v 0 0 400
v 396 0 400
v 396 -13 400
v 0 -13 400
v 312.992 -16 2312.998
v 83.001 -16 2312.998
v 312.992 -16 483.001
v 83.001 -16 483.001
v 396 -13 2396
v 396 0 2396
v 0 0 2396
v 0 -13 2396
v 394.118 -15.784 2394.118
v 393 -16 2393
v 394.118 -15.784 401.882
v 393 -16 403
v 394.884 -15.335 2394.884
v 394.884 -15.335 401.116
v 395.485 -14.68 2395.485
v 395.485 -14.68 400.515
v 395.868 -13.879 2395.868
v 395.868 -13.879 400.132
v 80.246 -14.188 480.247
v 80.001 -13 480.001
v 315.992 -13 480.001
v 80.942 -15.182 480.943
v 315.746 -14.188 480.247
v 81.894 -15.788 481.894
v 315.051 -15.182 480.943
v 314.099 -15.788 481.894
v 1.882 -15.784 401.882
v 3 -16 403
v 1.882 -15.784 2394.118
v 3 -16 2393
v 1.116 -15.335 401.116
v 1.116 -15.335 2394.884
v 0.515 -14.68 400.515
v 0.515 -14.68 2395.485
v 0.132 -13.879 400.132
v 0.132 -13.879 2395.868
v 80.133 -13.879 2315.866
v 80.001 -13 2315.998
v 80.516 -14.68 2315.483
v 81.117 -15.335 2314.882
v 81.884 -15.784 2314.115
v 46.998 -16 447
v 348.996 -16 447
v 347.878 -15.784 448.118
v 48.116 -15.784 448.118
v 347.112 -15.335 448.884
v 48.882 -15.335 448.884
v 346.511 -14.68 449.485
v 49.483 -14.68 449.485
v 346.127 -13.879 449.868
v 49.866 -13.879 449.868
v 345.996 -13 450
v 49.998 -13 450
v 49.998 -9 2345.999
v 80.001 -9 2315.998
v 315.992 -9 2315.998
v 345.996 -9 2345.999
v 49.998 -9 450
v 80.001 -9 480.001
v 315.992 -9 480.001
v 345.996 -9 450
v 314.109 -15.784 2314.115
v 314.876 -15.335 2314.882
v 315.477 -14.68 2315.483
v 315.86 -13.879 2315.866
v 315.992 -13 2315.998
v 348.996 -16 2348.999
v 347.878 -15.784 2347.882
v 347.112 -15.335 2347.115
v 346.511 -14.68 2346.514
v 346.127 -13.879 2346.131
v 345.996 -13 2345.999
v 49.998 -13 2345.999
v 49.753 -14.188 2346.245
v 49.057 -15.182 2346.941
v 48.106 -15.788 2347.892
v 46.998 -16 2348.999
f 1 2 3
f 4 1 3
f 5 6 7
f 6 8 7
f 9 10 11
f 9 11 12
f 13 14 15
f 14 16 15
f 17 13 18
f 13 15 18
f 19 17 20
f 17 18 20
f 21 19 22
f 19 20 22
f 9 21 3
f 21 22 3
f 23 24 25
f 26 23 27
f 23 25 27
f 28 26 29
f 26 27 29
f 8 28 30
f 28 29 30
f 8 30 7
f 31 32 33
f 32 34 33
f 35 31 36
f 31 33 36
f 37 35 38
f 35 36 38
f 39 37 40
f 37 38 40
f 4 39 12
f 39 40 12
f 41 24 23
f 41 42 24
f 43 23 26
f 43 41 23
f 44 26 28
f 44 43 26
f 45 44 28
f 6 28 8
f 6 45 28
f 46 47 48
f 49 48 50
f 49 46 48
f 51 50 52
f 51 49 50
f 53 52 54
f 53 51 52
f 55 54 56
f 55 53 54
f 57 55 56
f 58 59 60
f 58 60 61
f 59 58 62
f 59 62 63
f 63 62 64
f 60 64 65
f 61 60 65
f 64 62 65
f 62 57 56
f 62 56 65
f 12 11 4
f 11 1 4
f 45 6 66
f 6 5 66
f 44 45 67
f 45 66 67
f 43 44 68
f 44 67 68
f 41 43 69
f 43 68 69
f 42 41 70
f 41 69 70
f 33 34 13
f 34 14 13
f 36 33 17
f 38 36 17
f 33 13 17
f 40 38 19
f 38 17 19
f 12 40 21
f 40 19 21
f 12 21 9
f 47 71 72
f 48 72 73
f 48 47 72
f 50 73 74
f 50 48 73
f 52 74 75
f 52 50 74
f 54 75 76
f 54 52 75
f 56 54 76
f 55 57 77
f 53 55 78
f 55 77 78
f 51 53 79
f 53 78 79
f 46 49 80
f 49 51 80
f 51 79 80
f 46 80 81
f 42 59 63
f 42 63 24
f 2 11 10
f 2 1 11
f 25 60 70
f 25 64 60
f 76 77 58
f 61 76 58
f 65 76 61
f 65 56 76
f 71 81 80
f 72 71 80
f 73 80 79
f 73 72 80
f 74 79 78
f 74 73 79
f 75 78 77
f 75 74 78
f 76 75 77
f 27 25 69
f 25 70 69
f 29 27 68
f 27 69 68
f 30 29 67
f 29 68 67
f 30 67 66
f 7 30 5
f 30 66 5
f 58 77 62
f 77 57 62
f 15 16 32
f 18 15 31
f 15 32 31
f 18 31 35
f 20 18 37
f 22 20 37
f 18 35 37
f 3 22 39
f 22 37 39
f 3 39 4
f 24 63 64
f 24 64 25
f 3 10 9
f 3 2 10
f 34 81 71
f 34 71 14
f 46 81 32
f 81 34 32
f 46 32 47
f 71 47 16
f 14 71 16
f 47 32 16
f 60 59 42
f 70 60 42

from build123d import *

# Parameters (mm, degrees)
F0_W      = 44.656470418
F0_H      = 33.8078811765
F1_DEPTH  = 16
F2_DEPTH  = 796
F3_DEPTH  = 196
F4_W      = 68.9578056335
F4_H      = 493.6993122101
F5_DEPTH  = 7
F6_DEPTH  = 9.7
F7_DEPTH  = 99.33
F8_DEPTH  = 99.33
F9_DEPTH  = 17.34
F10_DEPTH = 102.97
F11_W     = 35.2807044983
F11_H     = 492.0964837074
F12_DEPTH = 7
F13_DEPTH = 37.27
F14_DEPTH = 6.58
F15_DEPTH = 106.63
F16_DEPTH = 5.87
F17_DEPTH = 200
F18_DEPTH = 200
F19_DEPTH = 200
F20_DEPTH = 200
F21_DEPTH = 200
F22_DEPTH = 200
F23_DEPTH = 400
F24_DEPTH = 400
F25_DEPTH = 400
F26_DEPTH = 400
F27_DEPTH = 400
F28_DEPTH = 400
F29_DEPTH = 400
F30_DEPTH = 400
F31_DEPTH = 400
F32_DEPTH = 1000
F33_DEPTH = 1000
F34_DEPTH = 1000
F35_DEPTH = 1000
F36_DEPTH = 1000
F37_DEPTH = 1000
F38_DEPTH = 600
F39_DEPTH = 600
F40_DEPTH = 600
F41_R     = 3


with BuildPart() as f1:
    # F0 (on Front) → F1 (new body)
    with BuildSketch(Plane.XZ):
        with Locations((22.328235209, 16.9039405882)):
            Rectangle(F0_W, F0_H)
    extrude(amount=F1_DEPTH)

    # F2 (add): a face of the model
    f2_faces = [f1.faces().sort_by_distance(p)[0] for p in [
        (22.328235209, -8, 0),
    ]]
    extrude(f2_faces, amount=-F2_DEPTH)

    # F3 (add): a face of the model
    f3_faces = [f1.faces().sort_by_distance(p)[0] for p in [
        (0, -8, 398),
    ]]
    extrude(f3_faces, amount=-F3_DEPTH)

    # F4 (on face) → F5 (cut)
    with BuildSketch(Plane.XZ.offset(16)):
        with Locations((94.1769480705, 399.8196721077)):
            Rectangle(F4_W, F4_H)
    extrude(amount=-F5_DEPTH, mode=Mode.SUBTRACT)

    # F6 (cut): a face of the model
    f6_faces = [f1.faces().sort_by_distance(p)[0] for p in [
        (59.6980452538, -12.5, 399.8196721077),
    ]]
    extrude(f6_faces, amount=-F6_DEPTH, mode=Mode.SUBTRACT)

    # F7 (add): a face of the model
    f7_faces = [f1.faces().sort_by_distance(p)[0] for p in [
        (89.3269480705, -12.5, 646.6693282127),
    ]]
    extrude(f7_faces, amount=-F7_DEPTH)

    # F8 (cut): a face of the model
    f8_faces = [f1.faces().sort_by_distance(p)[0] for p in [
        (89.3269480705, -12.5, 646.6693282127),
    ]]
    extrude(f8_faces, amount=-F8_DEPTH, mode=Mode.SUBTRACT)

    # F9 (cut): a face of the model
    f9_faces = [f1.faces().sort_by_distance(p)[0] for p in [
        (128.6558508873, -12.5, 449.4846721077),
    ]]
    extrude(f9_faces, amount=-F9_DEPTH, mode=Mode.SUBTRACT)

    # F10 (cut): a face of the model
    f10_faces = [f1.faces().sort_by_distance(p)[0] for p in [
        (97.9969480705, -12.5, 152.9700160027),
    ]]
    extrude(f10_faces, amount=-F10_DEPTH, mode=Mode.SUBTRACT)

    # F11 (on face) → F12 (join)
    with BuildSketch(Plane.XZ.offset(9)):
        with Locations((91.7714834213, 432.6795041561)):
            Rectangle(F11_W, F11_H)
    extrude(amount=F12_DEPTH)

    # F13 (add): a face of the model
    f13_faces = [f1.faces().sort_by_distance(p)[0] for p in [
        (91.7714834213, -12.5, 678.7277460098),
    ]]
    extrude(f13_faces, amount=F13_DEPTH)

    # F14 (add): a face of the model
    f14_faces = [f1.faces().sort_by_distance(p)[0] for p in [
        (109.4118356705, -12.5, 451.3145041561),
    ]]
    extrude(f14_faces, amount=F14_DEPTH)

    # F15 (add): a face of the model
    f15_faces = [f1.faces().sort_by_distance(p)[0] for p in [
        (95.0614834213, -12.5, 186.6312623024),
    ]]
    extrude(f15_faces, amount=F15_DEPTH)

    # F16 (cut): a face of the model
    f16_faces = [f1.faces().sort_by_distance(p)[0] for p in [
        (74.1311311722, -12.5, 397.9995041561),
    ]]
    extrude(f16_faces, amount=-F16_DEPTH, mode=Mode.SUBTRACT)

    # F17 (add): a face of the model
    f17_faces = [f1.faces().sort_by_distance(p)[0] for p in [
        (196, -8, 398),
    ]]
    extrude(f17_faces, amount=F17_DEPTH)

    # F18 (cut): a face of the model
    f18_faces = [f1.faces().sort_by_distance(p)[0] for p in [
        (145.9958508873, -12.5, 397.9996721077),
    ]]
    extrude(f18_faces, amount=-F18_DEPTH, mode=Mode.SUBTRACT)

    # F19 (add): a face of the model
    f19_faces = [f1.faces().sort_by_distance(p)[0] for p in [
        (115.9918356705, -12.5, 397.9995041561),
    ]]
    extrude(f19_faces, amount=F19_DEPTH)

    # F20 (add): a face of the model
    f20_faces = [f1.faces().sort_by_distance(p)[0] for p in [
        (396, -8, 398),
    ]]
    extrude(f20_faces, amount=F20_DEPTH)

    # F21 (cut): a face of the model
    f21_faces = [f1.faces().sort_by_distance(p)[0] for p in [
        (345.9958508873, -12.5, 397.9996721077),
    ]]
    extrude(f21_faces, amount=-F21_DEPTH, mode=Mode.SUBTRACT)

    # F22 (add): a face of the model
    f22_faces = [f1.faces().sort_by_distance(p)[0] for p in [
        (315.9918356705, -12.5, 397.9995041561),
    ]]
    extrude(f22_faces, amount=F22_DEPTH)

    # F23 (add): a face of the model
    f23_faces = [f1.faces().sort_by_distance(p)[0] for p in [
        (596, -8, 398),
    ]]
    extrude(f23_faces, amount=F23_DEPTH)

    # F24 (cut): a face of the model
    f24_faces = [f1.faces().sort_by_distance(p)[0] for p in [
        (545.9958508873, -12.5, 397.9996721077),
    ]]
    extrude(f24_faces, amount=-F24_DEPTH, mode=Mode.SUBTRACT)

    # F25 (add): a face of the model
    f25_faces = [f1.faces().sort_by_distance(p)[0] for p in [
        (515.9918356705, -12.5, 397.9995041561),
    ]]
    extrude(f25_faces, amount=F25_DEPTH)

    # F26 (cut): a face of the model
    f26_faces = [f1.faces().sort_by_distance(p)[0] for p in [
        (497.9964834213, -12.5, 80.0012623024),
    ]]
    extrude(f26_faces, amount=-F26_DEPTH, mode=Mode.SUBTRACT)

    # F27 (add): a face of the model
    f27_faces = [f1.faces().sort_by_distance(p)[0] for p in [
        (497.9969480705, -12.5, 50.0000160027),
    ]]
    extrude(f27_faces, amount=F27_DEPTH)

    # F28 (cut): a face of the model
    f28_faces = [f1.faces().sort_by_distance(p)[0] for p in [
        (498, -8, 0),
    ]]
    extrude(f28_faces, amount=-F28_DEPTH, mode=Mode.SUBTRACT)

    # F29 (add): a face of the model
    f29_faces = [f1.faces().sort_by_distance(p)[0] for p in [
        (996, -8, 598),
    ]]
    extrude(f29_faces, amount=F29_DEPTH)

    # F30 (cut): a face of the model
    f30_faces = [f1.faces().sort_by_distance(p)[0] for p in [
        (945.9958508873, -12.5, 597.9996721077),
    ]]
    extrude(f30_faces, amount=-F30_DEPTH, mode=Mode.SUBTRACT)

    # F31 (add): a face of the model
    f31_faces = [f1.faces().sort_by_distance(p)[0] for p in [
        (915.9918356705, -12.5, 597.9995041561),
    ]]
    extrude(f31_faces, amount=F31_DEPTH)

    # F32 (cut): a face of the model
    f32_faces = [f1.faces().sort_by_distance(p)[0] for p in [
        (1315.9918356705, -12.5, 597.9995041561),
    ]]
    extrude(f32_faces, amount=-F32_DEPTH, mode=Mode.SUBTRACT)

    # F33 (add): a face of the model
    f33_faces = [f1.faces().sort_by_distance(p)[0] for p in [
        (1345.9958508873, -12.5, 597.9996721077),
    ]]
    extrude(f33_faces, amount=F33_DEPTH)

    # F34 (cut): a face of the model
    f34_faces = [f1.faces().sort_by_distance(p)[0] for p in [
        (1396, -8, 598),
    ]]
    extrude(f34_faces, amount=-F34_DEPTH, mode=Mode.SUBTRACT)

    # F35 (add): a face of the model
    f35_faces = [f1.faces().sort_by_distance(p)[0] for p in [
        (198, -8, 796),
    ]]
    extrude(f35_faces, amount=F35_DEPTH)

    # F36 (cut): a face of the model
    f36_faces = [f1.faces().sort_by_distance(p)[0] for p in [
        (197.9969480705, -12.5, 745.9993282127),
    ]]
    extrude(f36_faces, amount=-F36_DEPTH, mode=Mode.SUBTRACT)

    # F37 (add): a face of the model
    f37_faces = [f1.faces().sort_by_distance(p)[0] for p in [
        (197.9964834213, -12.5, 715.9977460098),
    ]]
    extrude(f37_faces, amount=F37_DEPTH)

    # F38 (add): a face of the model
    f38_faces = [f1.faces().sort_by_distance(p)[0] for p in [
        (198, -8, 1796),
    ]]
    extrude(f38_faces, amount=F38_DEPTH)

    # F39 (cut): a face of the model
    f39_faces = [f1.faces().sort_by_distance(p)[0] for p in [
        (197.9969480705, -12.5, 1745.9993282127),
    ]]
    extrude(f39_faces, amount=-F39_DEPTH, mode=Mode.SUBTRACT)

    # F40 (add): a face of the model
    f40_faces = [f1.faces().sort_by_distance(p)[0] for p in [
        (197.9964834213, -12.5, 1715.9977460098),
    ]]
    extrude(f40_faces, amount=F40_DEPTH)

    # F41
    f41_edges = [f1.edges().sort_by_distance(p)[0] for p in [
        (197.996483, -16, 2315.997746),
        (315.991836, -16, 1397.999504),
        (197.996483, -16, 480.001262),
        (80.001131, -16, 1397.999504),
        (0, -16, 1398),
        (198, -16, 400),
        (396, -16, 1398),
        (198, -16, 2396),
        (345.995851, -16, 1397.999672),
        (197.996948, -16, 450.000016),
        (49.998045, -16, 1397.999672),
        (197.996948, -16, 2345.999328),
    ]]
    fillet(f41_edges, radius=F41_R)


solid = f1.part
